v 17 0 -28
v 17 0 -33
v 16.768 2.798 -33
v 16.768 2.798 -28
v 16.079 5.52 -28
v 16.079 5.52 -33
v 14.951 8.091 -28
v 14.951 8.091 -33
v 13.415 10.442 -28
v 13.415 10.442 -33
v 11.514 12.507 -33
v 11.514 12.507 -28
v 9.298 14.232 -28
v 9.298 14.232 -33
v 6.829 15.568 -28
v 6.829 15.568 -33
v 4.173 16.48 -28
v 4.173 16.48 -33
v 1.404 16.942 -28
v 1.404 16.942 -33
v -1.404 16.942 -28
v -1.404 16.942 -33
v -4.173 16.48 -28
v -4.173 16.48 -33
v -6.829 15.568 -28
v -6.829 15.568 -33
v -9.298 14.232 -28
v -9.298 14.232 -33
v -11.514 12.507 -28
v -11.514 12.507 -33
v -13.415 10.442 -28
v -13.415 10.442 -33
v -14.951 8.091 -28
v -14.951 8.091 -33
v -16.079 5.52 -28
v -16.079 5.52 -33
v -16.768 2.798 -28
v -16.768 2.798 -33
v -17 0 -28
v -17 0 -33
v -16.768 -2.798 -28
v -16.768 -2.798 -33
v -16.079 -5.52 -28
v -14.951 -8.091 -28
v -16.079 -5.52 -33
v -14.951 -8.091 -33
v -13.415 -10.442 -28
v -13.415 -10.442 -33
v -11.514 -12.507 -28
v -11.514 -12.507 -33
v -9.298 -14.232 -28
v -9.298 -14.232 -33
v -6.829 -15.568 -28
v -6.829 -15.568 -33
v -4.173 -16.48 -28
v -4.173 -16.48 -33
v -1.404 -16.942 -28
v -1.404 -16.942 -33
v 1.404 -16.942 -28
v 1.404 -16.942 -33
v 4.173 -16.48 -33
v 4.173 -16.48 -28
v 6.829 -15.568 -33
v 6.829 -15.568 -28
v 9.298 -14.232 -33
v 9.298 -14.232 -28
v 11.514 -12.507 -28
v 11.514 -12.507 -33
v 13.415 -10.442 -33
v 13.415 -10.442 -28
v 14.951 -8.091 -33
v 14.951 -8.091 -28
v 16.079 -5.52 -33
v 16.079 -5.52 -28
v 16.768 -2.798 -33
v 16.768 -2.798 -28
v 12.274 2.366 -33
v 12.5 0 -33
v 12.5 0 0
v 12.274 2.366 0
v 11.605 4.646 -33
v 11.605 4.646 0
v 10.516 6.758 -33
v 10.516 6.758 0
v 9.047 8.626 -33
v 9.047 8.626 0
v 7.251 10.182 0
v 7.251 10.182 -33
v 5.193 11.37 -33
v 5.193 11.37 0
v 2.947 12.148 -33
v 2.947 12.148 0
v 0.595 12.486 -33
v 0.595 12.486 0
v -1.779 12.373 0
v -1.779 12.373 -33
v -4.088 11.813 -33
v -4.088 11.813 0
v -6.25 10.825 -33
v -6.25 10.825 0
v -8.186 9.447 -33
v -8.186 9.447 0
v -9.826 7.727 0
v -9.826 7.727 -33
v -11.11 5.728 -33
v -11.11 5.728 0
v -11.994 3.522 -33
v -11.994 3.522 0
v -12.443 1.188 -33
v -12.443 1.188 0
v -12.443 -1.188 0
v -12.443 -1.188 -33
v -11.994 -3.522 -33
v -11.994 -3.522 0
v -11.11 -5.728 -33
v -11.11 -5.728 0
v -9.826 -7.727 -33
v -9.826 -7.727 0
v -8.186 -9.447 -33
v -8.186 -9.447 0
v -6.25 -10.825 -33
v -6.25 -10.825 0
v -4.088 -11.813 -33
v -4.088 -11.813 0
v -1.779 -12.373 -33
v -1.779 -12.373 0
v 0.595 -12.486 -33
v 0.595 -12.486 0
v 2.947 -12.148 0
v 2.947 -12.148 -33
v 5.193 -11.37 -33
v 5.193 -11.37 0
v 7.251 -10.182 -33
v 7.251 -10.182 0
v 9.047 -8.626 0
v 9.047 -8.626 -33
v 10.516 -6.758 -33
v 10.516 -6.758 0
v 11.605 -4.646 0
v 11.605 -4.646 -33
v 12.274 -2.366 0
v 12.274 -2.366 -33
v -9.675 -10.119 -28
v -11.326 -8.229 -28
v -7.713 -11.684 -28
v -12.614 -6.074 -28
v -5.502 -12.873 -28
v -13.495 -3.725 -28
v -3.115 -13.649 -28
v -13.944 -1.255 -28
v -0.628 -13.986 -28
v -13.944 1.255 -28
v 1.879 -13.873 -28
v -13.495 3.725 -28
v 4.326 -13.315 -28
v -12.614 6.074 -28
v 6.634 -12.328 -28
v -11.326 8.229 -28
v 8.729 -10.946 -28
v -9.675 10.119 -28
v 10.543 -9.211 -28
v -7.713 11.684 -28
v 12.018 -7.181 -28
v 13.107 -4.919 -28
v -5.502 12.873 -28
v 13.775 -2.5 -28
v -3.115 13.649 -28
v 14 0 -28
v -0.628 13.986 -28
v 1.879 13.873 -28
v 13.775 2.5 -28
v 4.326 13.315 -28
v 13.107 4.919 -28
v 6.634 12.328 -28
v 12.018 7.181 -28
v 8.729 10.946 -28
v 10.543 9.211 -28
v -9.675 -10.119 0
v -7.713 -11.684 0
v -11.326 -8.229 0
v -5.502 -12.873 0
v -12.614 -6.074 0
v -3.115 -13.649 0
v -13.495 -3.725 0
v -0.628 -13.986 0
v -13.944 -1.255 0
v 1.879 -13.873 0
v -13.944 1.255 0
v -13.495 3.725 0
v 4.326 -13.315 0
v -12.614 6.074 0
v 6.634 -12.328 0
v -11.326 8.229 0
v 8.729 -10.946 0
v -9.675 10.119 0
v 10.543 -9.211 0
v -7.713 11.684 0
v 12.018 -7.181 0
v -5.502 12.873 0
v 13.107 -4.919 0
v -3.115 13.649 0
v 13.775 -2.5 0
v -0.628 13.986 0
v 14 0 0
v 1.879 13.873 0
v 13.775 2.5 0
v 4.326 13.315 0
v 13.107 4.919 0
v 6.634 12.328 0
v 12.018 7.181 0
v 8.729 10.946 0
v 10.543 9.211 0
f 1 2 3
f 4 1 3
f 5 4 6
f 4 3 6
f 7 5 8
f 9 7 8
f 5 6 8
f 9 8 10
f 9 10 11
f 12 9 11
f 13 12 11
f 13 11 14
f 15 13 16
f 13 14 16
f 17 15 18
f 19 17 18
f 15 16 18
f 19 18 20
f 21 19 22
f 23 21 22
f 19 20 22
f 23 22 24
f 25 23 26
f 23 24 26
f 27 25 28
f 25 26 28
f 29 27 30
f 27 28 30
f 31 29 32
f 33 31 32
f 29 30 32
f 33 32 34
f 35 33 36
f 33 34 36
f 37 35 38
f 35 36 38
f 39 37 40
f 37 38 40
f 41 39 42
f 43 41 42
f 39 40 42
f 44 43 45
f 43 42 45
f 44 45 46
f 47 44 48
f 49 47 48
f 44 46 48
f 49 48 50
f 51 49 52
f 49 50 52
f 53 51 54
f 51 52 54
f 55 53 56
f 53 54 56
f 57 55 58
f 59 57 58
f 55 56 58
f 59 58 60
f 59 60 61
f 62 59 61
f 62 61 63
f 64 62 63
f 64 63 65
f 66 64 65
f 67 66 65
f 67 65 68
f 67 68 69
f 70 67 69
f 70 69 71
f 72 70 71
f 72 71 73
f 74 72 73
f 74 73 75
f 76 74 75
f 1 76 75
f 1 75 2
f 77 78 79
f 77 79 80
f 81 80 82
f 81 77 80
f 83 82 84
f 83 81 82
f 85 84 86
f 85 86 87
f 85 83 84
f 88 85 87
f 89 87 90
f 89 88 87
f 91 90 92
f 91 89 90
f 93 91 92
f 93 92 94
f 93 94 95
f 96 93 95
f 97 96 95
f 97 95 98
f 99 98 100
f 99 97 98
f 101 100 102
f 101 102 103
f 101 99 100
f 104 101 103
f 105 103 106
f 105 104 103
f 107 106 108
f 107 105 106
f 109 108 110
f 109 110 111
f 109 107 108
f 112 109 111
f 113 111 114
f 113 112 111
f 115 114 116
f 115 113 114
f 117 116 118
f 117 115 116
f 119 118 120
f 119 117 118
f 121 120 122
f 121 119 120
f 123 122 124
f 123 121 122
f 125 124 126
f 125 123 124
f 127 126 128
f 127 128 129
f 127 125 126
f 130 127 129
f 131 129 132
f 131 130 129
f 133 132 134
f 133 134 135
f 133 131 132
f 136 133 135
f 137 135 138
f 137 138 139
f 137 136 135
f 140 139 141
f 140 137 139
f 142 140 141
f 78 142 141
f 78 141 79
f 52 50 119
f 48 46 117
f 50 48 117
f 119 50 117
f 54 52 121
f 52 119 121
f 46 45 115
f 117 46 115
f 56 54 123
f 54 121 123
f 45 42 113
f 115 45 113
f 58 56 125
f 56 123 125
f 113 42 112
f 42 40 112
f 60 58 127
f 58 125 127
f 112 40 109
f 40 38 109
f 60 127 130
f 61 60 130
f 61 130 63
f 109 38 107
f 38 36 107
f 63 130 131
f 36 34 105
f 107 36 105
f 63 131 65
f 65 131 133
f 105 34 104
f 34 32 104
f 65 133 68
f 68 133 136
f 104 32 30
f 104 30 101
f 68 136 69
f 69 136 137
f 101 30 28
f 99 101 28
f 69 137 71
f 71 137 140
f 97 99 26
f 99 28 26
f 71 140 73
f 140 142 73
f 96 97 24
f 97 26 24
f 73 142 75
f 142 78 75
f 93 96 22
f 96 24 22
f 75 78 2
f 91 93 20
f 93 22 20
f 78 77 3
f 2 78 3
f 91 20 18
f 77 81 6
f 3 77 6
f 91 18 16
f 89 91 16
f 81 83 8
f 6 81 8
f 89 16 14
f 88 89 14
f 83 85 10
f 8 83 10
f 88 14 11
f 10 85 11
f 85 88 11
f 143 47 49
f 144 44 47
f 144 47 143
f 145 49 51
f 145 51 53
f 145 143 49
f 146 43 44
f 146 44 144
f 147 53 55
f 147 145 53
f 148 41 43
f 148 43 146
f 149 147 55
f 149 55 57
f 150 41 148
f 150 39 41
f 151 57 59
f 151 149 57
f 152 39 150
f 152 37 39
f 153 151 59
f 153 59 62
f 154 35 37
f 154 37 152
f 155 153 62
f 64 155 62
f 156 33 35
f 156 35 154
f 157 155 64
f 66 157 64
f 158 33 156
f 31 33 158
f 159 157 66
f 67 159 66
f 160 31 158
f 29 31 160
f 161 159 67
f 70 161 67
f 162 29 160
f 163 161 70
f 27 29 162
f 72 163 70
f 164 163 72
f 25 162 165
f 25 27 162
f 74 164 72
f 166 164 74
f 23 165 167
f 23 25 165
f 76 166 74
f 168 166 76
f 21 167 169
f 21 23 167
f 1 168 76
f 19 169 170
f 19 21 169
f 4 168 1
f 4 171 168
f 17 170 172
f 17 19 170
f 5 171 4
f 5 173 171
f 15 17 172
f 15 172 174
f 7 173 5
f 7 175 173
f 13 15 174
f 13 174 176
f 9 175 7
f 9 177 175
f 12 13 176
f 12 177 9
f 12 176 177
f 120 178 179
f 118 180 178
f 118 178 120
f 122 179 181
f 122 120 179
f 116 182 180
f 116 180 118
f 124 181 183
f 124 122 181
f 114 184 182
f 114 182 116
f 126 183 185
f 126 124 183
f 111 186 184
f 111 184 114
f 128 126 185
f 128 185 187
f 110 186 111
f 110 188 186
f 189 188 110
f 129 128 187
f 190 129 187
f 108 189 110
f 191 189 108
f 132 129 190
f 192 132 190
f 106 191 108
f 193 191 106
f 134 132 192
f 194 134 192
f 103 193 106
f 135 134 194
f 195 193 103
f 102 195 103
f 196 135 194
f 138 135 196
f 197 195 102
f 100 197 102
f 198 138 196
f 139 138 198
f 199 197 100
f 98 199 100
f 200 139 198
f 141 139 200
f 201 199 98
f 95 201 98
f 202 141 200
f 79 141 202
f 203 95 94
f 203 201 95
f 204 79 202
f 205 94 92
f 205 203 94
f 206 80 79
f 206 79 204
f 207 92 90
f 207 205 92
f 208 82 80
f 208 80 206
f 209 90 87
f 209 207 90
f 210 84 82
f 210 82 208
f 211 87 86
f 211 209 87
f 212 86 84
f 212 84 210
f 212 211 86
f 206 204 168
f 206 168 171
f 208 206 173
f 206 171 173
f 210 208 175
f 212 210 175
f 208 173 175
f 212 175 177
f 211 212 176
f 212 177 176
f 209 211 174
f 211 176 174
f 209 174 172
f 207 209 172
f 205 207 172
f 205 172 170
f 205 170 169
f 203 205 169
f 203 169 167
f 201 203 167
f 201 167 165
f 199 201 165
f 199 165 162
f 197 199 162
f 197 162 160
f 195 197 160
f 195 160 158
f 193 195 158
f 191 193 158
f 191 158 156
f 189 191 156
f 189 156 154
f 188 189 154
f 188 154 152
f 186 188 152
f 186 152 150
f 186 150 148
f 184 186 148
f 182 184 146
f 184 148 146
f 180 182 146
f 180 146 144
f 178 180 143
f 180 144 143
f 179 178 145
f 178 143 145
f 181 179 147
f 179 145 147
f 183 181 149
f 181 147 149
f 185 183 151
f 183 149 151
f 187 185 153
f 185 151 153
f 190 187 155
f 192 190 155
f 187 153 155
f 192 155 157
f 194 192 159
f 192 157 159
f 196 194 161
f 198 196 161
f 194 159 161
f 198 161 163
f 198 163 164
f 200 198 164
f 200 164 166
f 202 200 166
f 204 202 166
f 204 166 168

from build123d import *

# Parameters (mm, degrees)
CYLINDER093_R     = 1.5
CYLINDER093_DEPTH = 14
CYLINDER090_R     = 12.5
CYLINDER090_DEPTH = 33
CYLINDER094_R     = 1.5
CYLINDER094_DEPTH = 14
CYLINDER088_R     = 14
CYLINDER088_DEPTH = 33
BOX016_W          = 1
BOX016_H          = 1
BOX016_DEPTH      = 1
CYLINDER084_R     = 17
CYLINDER084_DEPTH = 5


with BuildPart() as ftinsmount1:
    # Cylinder093 → Cylinder093 (new body)
    with BuildSketch(Plane(origin=(53.66, 148, -15), x_dir=(1, 0, 0), z_dir=(0, 0, 1))):
        Circle(CYLINDER093_R)
    extrude(amount=CYLINDER093_DEPTH)


with BuildPart() as ftinsinnerhole:
    # Cylinder090 → Cylinder090 (new body)
    with BuildSketch(Plane(origin=(73.66, 148, -10), x_dir=(1, 0, 0), z_dir=(0, 0, 1))):
        Circle(CYLINDER090_R)
    extrude(amount=CYLINDER090_DEPTH)


with BuildPart() as fusion039:
    # Cylinder094 → Cylinder094 (new body)
    with BuildSketch(Plane(origin=(93.66, 148, -14), x_dir=(1, 0, 0), z_dir=(0, 0, 1))):
        Circle(CYLINDER094_R)
    extrude(amount=CYLINDER094_DEPTH)

    # Fusion039: union FTInsMount1, FTInsInnerHole
    add(ftinsmount1.part)
    add(ftinsinnerhole.part)


with BuildPart() as feedthrough008:
    # Cylinder088 → Cylinder088 (new body)
    with BuildSketch(Plane(origin=(73.66, 148, -10), x_dir=(1, 0, 0), z_dir=(0, 0, 1))):
        Circle(CYLINDER088_R)
    extrude(amount=CYLINDER088_DEPTH)


with BuildPart() as ftinslug:
    # Box016 → Box016 (new body)
    with BuildSketch(Plane(origin=(63, 136, -8), x_dir=(1, 0, 0), z_dir=(0, 0, 1))):
        with Locations((0.5, 0.5)):
            Rectangle(BOX016_W, BOX016_H)
    extrude(amount=BOX016_DEPTH)


with BuildPart() as base_ftinsulator1:
    # Cylinder084 → Cylinder084 (new body)
    with BuildSketch(Plane(origin=(73.66, 148, -10), x_dir=(1, 0, 0), z_dir=(0, 0, 1))):
        Circle(CYLINDER084_R)
    extrude(amount=CYLINDER084_DEPTH)

    # Fusion038: union Feedthrough008, FTInsLug
    add(feedthrough008.part)
    add(ftinslug.part)

    # Cut010: cut Fusion039
    add(fusion039.part, mode=Mode.SUBTRACT)


with BuildPart() as base_ftinsulator1_1:
    # Cut010 placement: moved
    add(base_ftinsulator1.part.moved(Location((-73.66, -148, -23))))


solid = base_ftinsulator1_1.part
